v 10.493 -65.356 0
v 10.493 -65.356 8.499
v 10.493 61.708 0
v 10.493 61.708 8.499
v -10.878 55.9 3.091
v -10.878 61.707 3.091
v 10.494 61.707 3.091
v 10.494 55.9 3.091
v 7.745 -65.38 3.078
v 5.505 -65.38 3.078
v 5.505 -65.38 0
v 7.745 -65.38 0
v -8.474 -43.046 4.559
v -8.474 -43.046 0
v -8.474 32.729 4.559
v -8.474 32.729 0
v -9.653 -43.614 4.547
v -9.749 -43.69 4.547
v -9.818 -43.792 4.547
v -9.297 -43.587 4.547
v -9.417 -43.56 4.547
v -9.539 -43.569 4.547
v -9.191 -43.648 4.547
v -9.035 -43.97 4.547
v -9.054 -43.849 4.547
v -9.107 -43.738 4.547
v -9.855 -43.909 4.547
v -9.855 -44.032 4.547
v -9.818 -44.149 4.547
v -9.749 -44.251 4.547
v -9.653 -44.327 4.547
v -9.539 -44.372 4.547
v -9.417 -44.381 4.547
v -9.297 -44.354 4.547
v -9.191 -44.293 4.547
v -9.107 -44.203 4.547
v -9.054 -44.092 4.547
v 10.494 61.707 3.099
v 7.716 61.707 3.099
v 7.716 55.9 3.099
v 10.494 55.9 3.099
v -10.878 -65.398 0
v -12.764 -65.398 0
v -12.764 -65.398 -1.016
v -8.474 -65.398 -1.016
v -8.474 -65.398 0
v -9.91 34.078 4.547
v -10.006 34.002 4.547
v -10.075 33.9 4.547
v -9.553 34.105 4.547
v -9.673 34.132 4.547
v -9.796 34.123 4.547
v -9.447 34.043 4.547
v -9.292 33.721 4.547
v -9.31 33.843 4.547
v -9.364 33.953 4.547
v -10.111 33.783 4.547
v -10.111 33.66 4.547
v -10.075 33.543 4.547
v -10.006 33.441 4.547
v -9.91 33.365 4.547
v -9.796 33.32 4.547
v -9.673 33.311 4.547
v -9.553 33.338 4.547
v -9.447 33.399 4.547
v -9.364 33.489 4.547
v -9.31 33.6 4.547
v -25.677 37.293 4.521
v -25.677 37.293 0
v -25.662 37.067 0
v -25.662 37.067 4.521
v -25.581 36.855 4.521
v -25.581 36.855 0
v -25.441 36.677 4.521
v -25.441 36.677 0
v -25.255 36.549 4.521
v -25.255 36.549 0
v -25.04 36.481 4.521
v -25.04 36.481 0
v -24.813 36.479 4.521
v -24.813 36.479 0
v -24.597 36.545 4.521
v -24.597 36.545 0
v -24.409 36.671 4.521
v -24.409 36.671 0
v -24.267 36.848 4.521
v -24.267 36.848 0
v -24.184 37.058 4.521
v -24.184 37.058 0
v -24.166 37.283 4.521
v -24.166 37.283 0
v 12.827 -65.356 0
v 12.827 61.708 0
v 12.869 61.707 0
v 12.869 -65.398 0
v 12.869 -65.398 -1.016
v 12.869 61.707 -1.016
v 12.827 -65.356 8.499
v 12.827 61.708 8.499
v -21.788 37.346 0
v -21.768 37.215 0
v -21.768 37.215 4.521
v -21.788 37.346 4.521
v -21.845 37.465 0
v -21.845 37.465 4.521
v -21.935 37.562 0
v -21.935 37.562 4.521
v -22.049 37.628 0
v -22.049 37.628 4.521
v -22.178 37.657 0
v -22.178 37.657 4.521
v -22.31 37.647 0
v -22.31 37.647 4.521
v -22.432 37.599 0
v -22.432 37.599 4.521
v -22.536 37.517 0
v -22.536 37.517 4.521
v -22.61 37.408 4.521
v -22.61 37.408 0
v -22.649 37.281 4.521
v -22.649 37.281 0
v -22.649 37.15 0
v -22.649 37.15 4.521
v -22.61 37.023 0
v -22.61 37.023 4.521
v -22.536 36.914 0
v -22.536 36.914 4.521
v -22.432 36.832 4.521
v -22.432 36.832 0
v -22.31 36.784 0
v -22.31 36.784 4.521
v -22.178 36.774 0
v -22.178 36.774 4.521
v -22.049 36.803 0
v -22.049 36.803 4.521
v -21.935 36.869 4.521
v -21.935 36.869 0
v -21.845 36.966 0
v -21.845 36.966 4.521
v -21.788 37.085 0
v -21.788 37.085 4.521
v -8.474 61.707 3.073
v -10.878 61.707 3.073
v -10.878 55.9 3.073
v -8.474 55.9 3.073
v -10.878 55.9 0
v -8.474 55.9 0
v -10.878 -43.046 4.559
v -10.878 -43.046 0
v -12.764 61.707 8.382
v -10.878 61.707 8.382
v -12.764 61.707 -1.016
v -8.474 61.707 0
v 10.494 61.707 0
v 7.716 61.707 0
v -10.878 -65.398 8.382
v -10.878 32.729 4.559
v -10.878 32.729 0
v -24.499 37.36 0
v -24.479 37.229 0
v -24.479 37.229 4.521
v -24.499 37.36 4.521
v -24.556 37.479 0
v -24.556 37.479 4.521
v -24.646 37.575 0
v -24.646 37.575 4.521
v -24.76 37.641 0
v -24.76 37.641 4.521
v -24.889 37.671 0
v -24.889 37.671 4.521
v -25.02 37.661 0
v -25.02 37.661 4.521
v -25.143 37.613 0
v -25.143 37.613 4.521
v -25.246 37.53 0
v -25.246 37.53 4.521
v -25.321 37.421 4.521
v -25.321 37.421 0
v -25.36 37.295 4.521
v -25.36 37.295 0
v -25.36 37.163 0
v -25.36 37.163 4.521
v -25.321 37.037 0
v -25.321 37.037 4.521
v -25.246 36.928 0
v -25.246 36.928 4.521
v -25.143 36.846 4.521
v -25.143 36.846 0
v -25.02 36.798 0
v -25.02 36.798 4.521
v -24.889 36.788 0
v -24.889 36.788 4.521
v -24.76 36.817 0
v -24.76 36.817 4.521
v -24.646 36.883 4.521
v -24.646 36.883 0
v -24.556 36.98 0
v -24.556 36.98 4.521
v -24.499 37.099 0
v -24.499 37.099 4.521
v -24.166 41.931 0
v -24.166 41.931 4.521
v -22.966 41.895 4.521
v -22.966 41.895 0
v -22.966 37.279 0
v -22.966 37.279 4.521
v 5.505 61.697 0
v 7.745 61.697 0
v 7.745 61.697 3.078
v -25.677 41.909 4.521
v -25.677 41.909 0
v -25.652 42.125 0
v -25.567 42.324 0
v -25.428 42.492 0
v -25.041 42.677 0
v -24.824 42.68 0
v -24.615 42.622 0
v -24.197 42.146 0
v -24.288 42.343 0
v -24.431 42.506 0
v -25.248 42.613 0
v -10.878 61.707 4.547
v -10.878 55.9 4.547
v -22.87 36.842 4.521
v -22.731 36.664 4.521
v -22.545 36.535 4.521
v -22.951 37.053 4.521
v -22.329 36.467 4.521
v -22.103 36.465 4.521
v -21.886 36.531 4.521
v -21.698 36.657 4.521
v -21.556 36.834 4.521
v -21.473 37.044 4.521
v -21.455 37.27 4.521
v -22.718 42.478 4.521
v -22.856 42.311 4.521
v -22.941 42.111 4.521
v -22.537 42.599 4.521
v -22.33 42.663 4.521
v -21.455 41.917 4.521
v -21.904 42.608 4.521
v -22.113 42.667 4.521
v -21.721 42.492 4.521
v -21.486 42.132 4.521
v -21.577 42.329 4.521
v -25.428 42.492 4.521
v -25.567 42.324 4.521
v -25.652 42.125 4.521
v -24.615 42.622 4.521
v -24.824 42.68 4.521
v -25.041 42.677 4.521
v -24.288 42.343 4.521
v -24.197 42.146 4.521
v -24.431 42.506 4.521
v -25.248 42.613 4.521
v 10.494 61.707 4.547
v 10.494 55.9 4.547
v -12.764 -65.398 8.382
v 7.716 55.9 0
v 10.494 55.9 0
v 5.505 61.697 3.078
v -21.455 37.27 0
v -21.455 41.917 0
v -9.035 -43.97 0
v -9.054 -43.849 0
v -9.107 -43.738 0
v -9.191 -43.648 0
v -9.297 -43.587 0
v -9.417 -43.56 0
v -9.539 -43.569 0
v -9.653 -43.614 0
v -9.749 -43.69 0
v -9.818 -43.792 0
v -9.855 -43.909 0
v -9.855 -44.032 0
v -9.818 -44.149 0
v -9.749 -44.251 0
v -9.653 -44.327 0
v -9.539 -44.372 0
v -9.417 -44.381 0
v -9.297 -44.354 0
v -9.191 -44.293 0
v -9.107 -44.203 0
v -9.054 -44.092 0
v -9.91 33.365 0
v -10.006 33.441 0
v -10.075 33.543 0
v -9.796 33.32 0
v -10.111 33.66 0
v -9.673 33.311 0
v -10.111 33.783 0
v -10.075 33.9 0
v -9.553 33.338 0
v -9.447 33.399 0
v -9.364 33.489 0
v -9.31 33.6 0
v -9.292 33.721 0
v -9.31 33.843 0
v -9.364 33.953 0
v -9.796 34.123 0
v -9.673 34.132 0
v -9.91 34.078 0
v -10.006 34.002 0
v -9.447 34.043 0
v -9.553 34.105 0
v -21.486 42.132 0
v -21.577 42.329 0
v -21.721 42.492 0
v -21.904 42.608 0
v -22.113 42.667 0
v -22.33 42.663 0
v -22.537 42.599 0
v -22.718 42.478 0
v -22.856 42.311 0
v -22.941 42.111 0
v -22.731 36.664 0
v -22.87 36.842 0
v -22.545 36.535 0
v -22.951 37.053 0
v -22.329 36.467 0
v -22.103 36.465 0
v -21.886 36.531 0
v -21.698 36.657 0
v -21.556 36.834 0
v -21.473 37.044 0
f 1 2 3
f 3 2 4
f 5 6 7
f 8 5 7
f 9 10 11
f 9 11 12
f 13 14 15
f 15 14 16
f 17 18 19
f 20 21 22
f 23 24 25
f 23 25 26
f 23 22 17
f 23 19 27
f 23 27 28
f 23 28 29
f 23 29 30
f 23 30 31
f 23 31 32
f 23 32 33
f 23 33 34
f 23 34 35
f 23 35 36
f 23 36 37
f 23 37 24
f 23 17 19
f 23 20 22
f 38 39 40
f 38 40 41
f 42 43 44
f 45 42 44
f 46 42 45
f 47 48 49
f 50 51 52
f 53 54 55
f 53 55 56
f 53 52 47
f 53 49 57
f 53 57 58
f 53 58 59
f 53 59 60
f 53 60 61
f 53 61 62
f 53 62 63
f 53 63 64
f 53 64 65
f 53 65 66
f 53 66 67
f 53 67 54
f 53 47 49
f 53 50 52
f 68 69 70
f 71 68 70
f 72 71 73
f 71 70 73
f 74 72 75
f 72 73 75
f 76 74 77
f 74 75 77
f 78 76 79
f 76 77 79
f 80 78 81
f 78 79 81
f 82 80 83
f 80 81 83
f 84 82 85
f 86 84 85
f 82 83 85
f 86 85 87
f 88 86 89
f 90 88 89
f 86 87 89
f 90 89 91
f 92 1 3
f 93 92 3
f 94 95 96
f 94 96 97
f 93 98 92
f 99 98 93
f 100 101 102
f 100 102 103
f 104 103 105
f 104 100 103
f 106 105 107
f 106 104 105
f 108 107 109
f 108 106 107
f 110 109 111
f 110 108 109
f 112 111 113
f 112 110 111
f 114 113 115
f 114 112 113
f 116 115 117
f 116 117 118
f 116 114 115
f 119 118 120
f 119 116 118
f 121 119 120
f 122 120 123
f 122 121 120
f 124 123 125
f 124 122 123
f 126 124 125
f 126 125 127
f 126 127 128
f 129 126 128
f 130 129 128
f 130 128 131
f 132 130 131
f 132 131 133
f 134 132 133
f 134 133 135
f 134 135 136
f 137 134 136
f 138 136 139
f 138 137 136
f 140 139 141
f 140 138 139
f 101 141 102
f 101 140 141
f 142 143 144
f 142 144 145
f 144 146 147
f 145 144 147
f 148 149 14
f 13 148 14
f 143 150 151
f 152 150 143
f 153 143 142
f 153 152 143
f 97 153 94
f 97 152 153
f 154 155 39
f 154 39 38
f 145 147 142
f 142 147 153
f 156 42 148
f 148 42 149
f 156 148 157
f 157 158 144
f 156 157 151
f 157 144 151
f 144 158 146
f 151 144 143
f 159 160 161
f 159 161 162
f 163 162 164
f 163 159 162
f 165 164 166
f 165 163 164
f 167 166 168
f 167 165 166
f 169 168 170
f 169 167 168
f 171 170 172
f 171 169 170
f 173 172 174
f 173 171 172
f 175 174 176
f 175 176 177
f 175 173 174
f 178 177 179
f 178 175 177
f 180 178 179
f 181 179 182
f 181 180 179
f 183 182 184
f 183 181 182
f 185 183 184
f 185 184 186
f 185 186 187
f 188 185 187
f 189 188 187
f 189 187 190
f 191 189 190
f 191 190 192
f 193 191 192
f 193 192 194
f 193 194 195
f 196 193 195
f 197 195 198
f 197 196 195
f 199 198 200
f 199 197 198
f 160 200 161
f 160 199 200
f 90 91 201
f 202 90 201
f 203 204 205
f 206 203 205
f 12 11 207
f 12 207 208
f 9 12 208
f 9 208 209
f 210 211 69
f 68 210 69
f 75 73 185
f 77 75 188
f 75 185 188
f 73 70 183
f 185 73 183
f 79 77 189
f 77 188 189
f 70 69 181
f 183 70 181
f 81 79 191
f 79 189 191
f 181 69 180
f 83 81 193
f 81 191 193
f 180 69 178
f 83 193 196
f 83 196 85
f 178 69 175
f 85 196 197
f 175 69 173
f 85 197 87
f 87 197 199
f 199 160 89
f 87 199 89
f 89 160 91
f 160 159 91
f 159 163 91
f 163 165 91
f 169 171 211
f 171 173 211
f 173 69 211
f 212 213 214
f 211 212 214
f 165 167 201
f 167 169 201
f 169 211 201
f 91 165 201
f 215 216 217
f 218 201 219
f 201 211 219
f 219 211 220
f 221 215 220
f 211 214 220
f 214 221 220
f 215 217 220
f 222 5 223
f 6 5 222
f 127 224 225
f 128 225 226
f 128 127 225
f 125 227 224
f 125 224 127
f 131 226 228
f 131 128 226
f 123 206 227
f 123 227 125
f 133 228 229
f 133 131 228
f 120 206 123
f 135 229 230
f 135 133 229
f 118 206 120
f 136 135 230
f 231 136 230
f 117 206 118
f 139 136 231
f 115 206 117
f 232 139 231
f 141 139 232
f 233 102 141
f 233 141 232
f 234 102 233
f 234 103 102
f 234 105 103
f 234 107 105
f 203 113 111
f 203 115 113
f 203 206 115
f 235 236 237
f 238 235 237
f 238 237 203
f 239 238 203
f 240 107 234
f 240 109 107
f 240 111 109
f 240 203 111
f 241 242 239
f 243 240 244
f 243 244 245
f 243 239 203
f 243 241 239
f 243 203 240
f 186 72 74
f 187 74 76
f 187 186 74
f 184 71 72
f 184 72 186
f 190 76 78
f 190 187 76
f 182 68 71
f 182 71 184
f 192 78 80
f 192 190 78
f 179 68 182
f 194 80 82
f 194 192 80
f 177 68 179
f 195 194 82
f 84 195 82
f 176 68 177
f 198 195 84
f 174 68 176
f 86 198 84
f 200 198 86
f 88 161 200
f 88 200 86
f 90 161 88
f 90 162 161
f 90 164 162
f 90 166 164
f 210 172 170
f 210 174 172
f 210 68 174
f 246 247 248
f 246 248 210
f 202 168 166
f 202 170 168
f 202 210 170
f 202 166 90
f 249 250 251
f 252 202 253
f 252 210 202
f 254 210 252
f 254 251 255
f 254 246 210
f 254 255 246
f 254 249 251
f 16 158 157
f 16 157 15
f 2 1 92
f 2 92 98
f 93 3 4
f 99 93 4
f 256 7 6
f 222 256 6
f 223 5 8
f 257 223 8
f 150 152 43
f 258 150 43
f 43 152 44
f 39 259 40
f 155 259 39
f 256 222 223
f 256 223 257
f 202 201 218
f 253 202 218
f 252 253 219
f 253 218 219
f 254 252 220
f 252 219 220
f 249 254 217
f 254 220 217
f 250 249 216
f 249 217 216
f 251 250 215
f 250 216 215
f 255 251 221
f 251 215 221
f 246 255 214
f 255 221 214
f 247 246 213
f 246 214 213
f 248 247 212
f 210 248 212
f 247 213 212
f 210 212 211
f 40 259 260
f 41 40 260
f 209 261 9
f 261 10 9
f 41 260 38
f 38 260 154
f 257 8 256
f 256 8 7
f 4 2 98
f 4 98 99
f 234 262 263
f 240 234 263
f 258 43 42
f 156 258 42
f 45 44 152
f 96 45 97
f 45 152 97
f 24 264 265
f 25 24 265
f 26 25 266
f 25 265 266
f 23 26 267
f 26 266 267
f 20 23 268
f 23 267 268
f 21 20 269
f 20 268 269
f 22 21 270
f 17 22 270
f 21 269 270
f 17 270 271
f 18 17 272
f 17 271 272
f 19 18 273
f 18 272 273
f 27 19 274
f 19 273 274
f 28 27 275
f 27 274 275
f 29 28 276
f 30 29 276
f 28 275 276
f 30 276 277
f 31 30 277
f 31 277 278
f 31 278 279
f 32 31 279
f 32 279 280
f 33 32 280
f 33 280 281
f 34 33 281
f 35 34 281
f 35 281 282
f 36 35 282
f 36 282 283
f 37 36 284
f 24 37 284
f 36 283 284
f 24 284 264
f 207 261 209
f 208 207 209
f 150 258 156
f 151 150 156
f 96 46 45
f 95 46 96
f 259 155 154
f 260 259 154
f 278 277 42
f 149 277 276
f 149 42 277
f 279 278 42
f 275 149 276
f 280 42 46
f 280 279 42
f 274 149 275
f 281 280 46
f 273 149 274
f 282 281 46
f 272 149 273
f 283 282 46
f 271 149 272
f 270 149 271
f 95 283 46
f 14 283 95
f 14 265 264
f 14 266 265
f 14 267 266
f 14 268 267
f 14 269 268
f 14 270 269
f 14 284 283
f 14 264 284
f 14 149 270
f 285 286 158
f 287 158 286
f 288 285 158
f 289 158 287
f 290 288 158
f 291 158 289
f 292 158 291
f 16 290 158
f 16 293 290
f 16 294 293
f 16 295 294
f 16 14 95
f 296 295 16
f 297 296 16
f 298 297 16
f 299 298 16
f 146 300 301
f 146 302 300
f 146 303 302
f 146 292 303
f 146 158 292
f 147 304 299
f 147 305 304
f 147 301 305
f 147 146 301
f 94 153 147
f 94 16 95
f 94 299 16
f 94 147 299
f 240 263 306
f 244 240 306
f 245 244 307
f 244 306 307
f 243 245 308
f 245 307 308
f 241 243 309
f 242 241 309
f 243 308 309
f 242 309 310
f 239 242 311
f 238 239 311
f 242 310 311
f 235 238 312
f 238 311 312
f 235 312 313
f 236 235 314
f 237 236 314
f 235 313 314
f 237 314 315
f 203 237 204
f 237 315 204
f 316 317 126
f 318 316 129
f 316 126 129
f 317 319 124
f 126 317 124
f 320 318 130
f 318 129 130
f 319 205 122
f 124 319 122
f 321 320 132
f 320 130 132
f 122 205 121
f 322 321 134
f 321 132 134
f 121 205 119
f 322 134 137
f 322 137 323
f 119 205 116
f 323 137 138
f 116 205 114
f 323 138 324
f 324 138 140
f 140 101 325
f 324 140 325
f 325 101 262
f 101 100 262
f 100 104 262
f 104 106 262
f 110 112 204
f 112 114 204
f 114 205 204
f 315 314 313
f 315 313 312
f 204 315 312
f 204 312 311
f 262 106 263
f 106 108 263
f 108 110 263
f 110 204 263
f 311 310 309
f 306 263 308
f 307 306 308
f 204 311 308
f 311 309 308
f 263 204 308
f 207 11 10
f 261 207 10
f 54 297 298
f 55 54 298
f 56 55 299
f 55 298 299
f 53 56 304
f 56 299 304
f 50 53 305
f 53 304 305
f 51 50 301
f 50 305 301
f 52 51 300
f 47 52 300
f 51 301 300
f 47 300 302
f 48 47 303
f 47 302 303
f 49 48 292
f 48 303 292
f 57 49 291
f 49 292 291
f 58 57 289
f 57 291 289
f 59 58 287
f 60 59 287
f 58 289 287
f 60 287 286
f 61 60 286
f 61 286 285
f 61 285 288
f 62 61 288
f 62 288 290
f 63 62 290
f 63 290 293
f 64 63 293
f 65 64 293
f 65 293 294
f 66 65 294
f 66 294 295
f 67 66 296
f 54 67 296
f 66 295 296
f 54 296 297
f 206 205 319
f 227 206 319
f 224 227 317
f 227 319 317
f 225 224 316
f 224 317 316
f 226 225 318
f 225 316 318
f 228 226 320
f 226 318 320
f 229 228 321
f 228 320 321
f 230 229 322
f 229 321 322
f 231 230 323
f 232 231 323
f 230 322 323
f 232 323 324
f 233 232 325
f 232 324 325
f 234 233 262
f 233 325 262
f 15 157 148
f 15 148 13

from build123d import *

# Parameters (mm, degrees)
F4_START      = 10.49274
F2_W          = 127.0645558834
F2_H          = 8.4992311895
F4_DEPTH      = 2.33426
F3_W          = 2.2401837632
F3_H          = 3.077831585
F5_DEPTH      = 65.3796
F5_DEPTH_BACK = 61.6966
F0_W          = 2.7783904225
F0_H          = 121.2976649404
F0_W_2        = 2.3746788502
F0_W_3        = 2.2473796271
F0_W_4        = 2.404211089
F0_H_2        = 75.7749117911
F0_W_5        = 13.9418463223
F0_H_3        = 5.8071650565
F0_H_4        = 16.4588093758
F0_H_5        = 15.6432054937
F0_W_6        = 1.8864730373
F0_R          = 0.4426564057
F0_R_2        = 0.4119393831
F6_DEPTH      = 1.016
F7_DEPTH      = 8.382
F8_DEPTH      = 4.5466
F9_DEPTH      = 4.5593
F1_R          = 0.4426564057
F10_DEPTH     = 4.5212
F11_START     = 3.09118
F11_DEPTH     = 1.45542
F12_DEPTH     = 3.0734
F13_DEPTH     = 3.0988


with BuildPart() as f4:
    # F2 (on Right) → F4 (new body)
    with BuildSketch(Plane.YZ.offset(F4_START)):
        with Locations((-1.8238723278, 4.2496155947)):
            Rectangle(F2_W, F2_H)
    extrude(amount=F4_DEPTH)


with BuildPart() as f5:
    # F3 (on Front) → F5 (new body, two sides)
    with BuildSketch(Plane.XZ) as f5_sk:
        with Locations((6.6253291443, 1.5389157925)):
            Rectangle(F3_W, F3_H)
    extrude(amount=F5_DEPTH)
    extrude(f5_sk.sketch, amount=-F5_DEPTH_BACK)


with BuildPart() as f6:
    # F0 (on Top) → F6 (new body)
    with BuildSketch(Plane.XY):
        Polygon((5.4682078771, 55.8997914195), (-8.4736384451, 55.8997914195), (-8.4736384451, 39.4409820437), (-10.8778495342, 39.4409820437), (-10.8778495342, 32.728895545), (-8.4736384451, 32.728895545), (-8.4736384451, -43.0460162461), (-10.8778495342, -43.0460162461), (-10.8778495342, -49.7546680272), (-8.4736384451, -49.7546680272), (-8.4736384451, -65.3978735209), (5.4682078771, -65.3978735209), align=None)
        with BuildLine():
            ThreePointArc((-10.2032869281, -44.0247099272), (-9.4427499575, -43.2126265159), (-8.69210988, -44.0338666908))
            Line((-8.69210988, -44.0338666908), (-8.69210988, -48.6504066161))
            ThreePointArc((-8.69210988, -48.6504066161), (-9.4366474908, -49.42785915), (-10.2032869281, -48.6721921138))
            Line((-10.2032869281, -48.6721921138), (-10.2032869281, -44.0247099272))
        make_face(mode=Mode.SUBTRACT)
        with BuildLine():
            ThreePointArc((-8.9480215684, 33.7755940855), (-9.708558539, 32.9635106741), (-10.4591986164, 33.784750849))
            Line((-10.4591986164, 33.784750849), (-10.4591986164, 38.4012907743))
            ThreePointArc((-10.4591986164, 38.4012907743), (-9.7146610056, 39.1787433082), (-8.9480215684, 38.423076272))
            Line((-8.9480215684, 38.423076272), (-8.9480215684, 33.7755940855))
        make_face(mode=Mode.SUBTRACT)
        with Locations((9.1047827154, -4.7490410507)):
            Rectangle(F0_W, F0_H)
        with Locations((11.6813173518, -4.7490410507)):
            Rectangle(F0_W_2, F0_H)
        with Locations((6.5918976907, -4.7490410507)):
            Rectangle(F0_W_3, F0_H)
        Polygon((-10.8778495342, 55.8997914195), (-12.7643225715, 55.8997914195), (-12.7643225715, -65.3978735209), (-10.8778495342, -65.3978735209), (-10.8778495342, -49.7546680272), (-10.8778495342, -43.0460162461), (-10.8778495342, 32.728895545), (-10.8778495342, 39.4409820437), align=None)
        with Locations((-9.6757439896, -5.1585603505)):
            Rectangle(F0_W_4, F0_H_2)
        with Locations((-1.502715284, 58.8033739477)):
            Rectangle(F0_W_5, F0_H_3)
        with Locations((-9.6757439896, 47.6703867316)):
            Rectangle(F0_W_4, F0_H_4)
        with Locations((-9.6757439896, -57.576270774)):
            Rectangle(F0_W_4, F0_H_5)
        with Locations((9.1047827154, 58.8033739477)):
            Rectangle(F0_W, F0_H_3)
        with Locations((-9.6757439896, 58.8033739477)):
            Rectangle(F0_W_4, F0_H_3)
        with Locations((11.6813173518, 58.8033739477)):
            Rectangle(F0_W_2, F0_H_3)
        with Locations((6.5918976907, 58.8033739477)):
            Rectangle(F0_W_3, F0_H_3)
        with Locations((-11.8210860528, 58.8033739477)):
            Rectangle(F0_W_6, F0_H_3)
        with BuildLine():
            Line((-10.4591986164, 38.4012907743), (-10.4591986164, 33.784750849))
            ThreePointArc((-10.4591986164, 33.784750849), (-9.708558539, 32.9635106741), (-8.9480215684, 33.7755940855))
            Line((-8.9480215684, 33.7755940855), (-8.9480215684, 38.423076272))
            ThreePointArc((-8.9480215684, 38.423076272), (-9.7146610056, 39.1787433082), (-10.4591986164, 38.4012907743))
        make_face()
        with Locations((-9.7039663198, 33.7213828511)):
            Circle(F0_R, mode=Mode.SUBTRACT)
        with BuildLine():
            Line((-8.69210988, -48.6504066161), (-8.69210988, -44.0338666908))
            ThreePointArc((-8.69210988, -44.0338666908), (-9.4427499575, -43.2126265159), (-10.2032869281, -44.0247099272))
            Line((-10.2032869281, -44.0247099272), (-10.2032869281, -48.6721921138))
            ThreePointArc((-10.2032869281, -48.6721921138), (-9.4366474908, -49.42785915), (-8.69210988, -48.6504066161))
        make_face()
        with Locations((-9.4473421767, -43.9704986929)):
            Circle(F0_R, mode=Mode.SUBTRACT)
        with Locations((-9.7039663198, 33.7213828511)):
            Circle(F0_R)
        with Locations((-9.7039663198, 33.7213828511)):
            Circle(F0_R_2, mode=Mode.SUBTRACT)
        with Locations((-9.4473421767, -43.9704986929)):
            Circle(F0_R)
        with Locations((-9.4473421767, -43.9704986929)):
            Circle(F0_R_2, mode=Mode.SUBTRACT)
        with Locations((-9.7039663198, 33.7213828511)):
            Circle(F0_R_2)
        with Locations((-9.4473421767, -43.9704986929)):
            Circle(F0_R_2)
    extrude(amount=-F6_DEPTH)

    # F0 (on Top) → F7 (join)
    with BuildSketch(Plane.XY):
        Polygon((-10.8778495342, 55.8997914195), (-12.7643225715, 55.8997914195), (-12.7643225715, -65.3978735209), (-10.8778495342, -65.3978735209), (-10.8778495342, -49.7546680272), (-10.8778495342, -43.0460162461), (-10.8778495342, 32.728895545), (-10.8778495342, 39.4409820437), align=None)
        with Locations((-11.8210860528, 58.8033739477)):
            Rectangle(F0_W_6, F0_H_3)
    extrude(amount=F7_DEPTH)

    # F0 (on Top) → F8 (join)
    with BuildSketch(Plane.XY):
        with Locations((-9.4473421767, -43.9704986929)):
            Circle(F0_R_2)
        with Locations((-9.7039663198, 33.7213828511)):
            Circle(F0_R_2)
    extrude(amount=F8_DEPTH)

    # F0 (on Top) → F9 (join)
    with BuildSketch(Plane.XY):
        with Locations((-9.6757439896, -5.1585603505)):
            Rectangle(F0_W_4, F0_H_2)
    extrude(amount=F9_DEPTH)

    # F0 (on Top) → F12 (join)
    with BuildSketch(Plane.XY):
        with Locations((-9.6757439896, 58.8033739477)):
            Rectangle(F0_W_4, F0_H_3)
    extrude(amount=F12_DEPTH)


with BuildPart() as f10:
    # F1 (on Top) → F10 (new body)
    with BuildSketch(Plane.XY):
        with BuildLine():
            Line((-22.9663701724, 41.8953957223), (-22.9663701724, 37.278855797))
            ThreePointArc((-22.9663701724, 37.278855797), (-22.215730095, 36.4576156221), (-21.4551931244, 37.2696990334))
            Line((-21.4551931244, 37.2696990334), (-21.4551931244, 41.91718122))
            ThreePointArc((-21.4551931244, 41.91718122), (-22.2218325616, 42.6728482562), (-22.9663701724, 41.8953957223))
        make_face()
        with Locations((-22.2111378758, 37.2154877991)):
            Circle(F1_R, mode=Mode.SUBTRACT)
    extrude(amount=F10_DEPTH)


with BuildPart() as f10b:
    # F1 (on Top) → F10, piece 2 (new body)
    with BuildSketch(Plane.XY):
        with BuildLine():
            Line((-25.6770776581, 41.9091643952), (-25.6770776581, 37.2926244699))
            ThreePointArc((-25.6770776581, 37.2926244699), (-24.9264375807, 36.471384295), (-24.16590061, 37.2834677063))
            Line((-24.16590061, 37.2834677063), (-24.16590061, 41.9309498929))
            ThreePointArc((-24.16590061, 41.9309498929), (-24.9325400473, 42.6866169291), (-25.6770776581, 41.9091643952))
        make_face()
        with Locations((-24.9218453614, 37.229256472)):
            Circle(F1_R, mode=Mode.SUBTRACT)
    extrude(amount=F10_DEPTH)


with BuildPart() as f11:
    # F0 (on Top) → F11 (new body)
    with BuildSketch(Plane.XY.offset(F11_START)):
        with Locations((9.1047827154, 58.8033739477)):
            Rectangle(F0_W, F0_H_3)
        with Locations((6.5918976907, 58.8033739477)):
            Rectangle(F0_W_3, F0_H_3)
        with Locations((-1.502715284, 58.8033739477)):
            Rectangle(F0_W_5, F0_H_3)
        with Locations((-9.6757439896, 58.8033739477)):
            Rectangle(F0_W_4, F0_H_3)
    extrude(amount=F11_DEPTH)


with BuildPart() as f13:
    # F0 (on Top) → F13 (new body)
    with BuildSketch(Plane.XY):
        with Locations((9.1047827154, 58.8033739477)):
            Rectangle(F0_W, F0_H_3)
    extrude(amount=F13_DEPTH)


solid = Compound([f4.part, f5.part, f6.part, f10.part, f10b.part, f11.part, f13.part])
